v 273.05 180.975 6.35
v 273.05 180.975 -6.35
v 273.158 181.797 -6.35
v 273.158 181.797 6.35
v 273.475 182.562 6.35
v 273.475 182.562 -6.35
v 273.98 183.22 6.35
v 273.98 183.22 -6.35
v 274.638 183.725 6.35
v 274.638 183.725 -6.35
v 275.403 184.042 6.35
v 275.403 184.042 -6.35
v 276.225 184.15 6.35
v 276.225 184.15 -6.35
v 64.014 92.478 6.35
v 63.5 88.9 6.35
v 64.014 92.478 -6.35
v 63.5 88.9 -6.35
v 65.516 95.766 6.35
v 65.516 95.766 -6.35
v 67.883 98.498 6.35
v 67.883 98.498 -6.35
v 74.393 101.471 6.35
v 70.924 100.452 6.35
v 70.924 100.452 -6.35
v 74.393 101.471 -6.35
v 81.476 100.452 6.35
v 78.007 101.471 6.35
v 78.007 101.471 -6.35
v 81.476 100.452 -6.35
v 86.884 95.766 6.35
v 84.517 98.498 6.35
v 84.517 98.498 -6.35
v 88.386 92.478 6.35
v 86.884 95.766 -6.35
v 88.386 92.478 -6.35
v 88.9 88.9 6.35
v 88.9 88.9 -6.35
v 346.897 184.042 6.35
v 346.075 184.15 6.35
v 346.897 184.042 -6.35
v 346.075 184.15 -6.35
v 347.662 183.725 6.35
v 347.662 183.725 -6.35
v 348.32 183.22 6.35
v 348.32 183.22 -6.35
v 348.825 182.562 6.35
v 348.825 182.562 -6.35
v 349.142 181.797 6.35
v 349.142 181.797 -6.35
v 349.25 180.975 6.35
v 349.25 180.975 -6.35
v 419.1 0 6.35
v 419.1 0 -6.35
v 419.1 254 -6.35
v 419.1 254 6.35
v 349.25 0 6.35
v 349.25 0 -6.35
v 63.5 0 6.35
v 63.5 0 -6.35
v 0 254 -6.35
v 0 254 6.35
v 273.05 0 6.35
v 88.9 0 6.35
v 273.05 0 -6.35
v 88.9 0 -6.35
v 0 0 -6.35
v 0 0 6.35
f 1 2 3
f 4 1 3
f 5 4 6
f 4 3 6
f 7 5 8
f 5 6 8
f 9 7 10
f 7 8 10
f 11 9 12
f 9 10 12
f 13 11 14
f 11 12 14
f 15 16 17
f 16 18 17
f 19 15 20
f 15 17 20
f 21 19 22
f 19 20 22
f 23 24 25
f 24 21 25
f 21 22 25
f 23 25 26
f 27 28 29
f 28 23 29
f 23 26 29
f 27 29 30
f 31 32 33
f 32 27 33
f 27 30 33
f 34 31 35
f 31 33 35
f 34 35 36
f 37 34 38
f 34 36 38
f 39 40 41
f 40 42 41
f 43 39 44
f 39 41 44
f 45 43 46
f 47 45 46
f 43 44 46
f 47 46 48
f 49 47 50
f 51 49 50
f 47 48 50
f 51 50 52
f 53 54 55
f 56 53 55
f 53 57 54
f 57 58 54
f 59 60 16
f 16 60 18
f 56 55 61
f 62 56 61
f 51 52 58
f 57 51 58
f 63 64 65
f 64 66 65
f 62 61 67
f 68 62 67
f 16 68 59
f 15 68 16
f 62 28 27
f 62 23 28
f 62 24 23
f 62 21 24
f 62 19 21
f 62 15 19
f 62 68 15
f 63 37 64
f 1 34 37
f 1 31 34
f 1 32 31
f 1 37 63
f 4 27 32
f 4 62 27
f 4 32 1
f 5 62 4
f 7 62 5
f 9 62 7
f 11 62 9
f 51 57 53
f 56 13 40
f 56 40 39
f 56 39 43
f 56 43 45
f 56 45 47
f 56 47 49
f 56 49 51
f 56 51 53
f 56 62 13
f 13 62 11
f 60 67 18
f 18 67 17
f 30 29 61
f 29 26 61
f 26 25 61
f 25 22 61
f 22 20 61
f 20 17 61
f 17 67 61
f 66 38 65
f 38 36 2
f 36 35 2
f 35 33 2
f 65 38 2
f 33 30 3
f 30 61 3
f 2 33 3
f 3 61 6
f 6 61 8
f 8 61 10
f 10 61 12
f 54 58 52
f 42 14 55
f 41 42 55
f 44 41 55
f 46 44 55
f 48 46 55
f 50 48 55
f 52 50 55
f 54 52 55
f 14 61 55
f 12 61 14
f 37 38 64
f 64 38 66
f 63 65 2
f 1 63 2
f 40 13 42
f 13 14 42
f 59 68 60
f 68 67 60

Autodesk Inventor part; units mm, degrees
ref_plane "YZ Plane" through (0, 0, 0) normal (1, 0, 0) x (0, 1, 0)
ref_plane "XZ Plane" through (0, 0, 0) normal (0, 1, 0) x (-1, 0, 0)
ref_plane "XY Plane" through (0, 0, 0) normal (0, 0, 1) x (1, 0, 0)
sketch "Sketch1" plane through (0, 0, 0) normal (0, 0, 1) x (1, 0, 0)
  line L0 (0, 0) -> (419.1, 0)
  line L1 (419.1, 0) -> (419.1, 254)
  line L2 (419.1, 254) -> (0, 254)
  line L3 (0, 254) -> (0, 0)
  line L4 (273.05, 184.15) -> (349.25, 184.15)
  line L5 (349.25, 184.15) -> (349.25, 0)
  line L6 (349.25, 0) -> (273.05, 0)
  line L7 (273.05, 0) -> (273.05, 184.15)
  circle A0 centre (76.2, 88.9) radius 12.7
  line L8 (63.5, 88.9) -> (88.9, 88.9)
  line L9 (88.9, 88.9) -> (88.9, 0)
  line L10 (88.9, 0) -> (63.5, 0)
  line L11 (63.5, 0) -> (63.5, 88.9)
  dimension "d5" = 25.4
  dimension "d0" = 419.1
  dimension "d1" = 254
  dimension "d2" = 76.2
  dimension "d3" = 184.15
  dimension "d4" = 273.05
  dimension "d6" = 88.9
  dimension "d7" = 63.5
  dimension "d8" = 25.4
  dimension "d9" = 76.2
extrude "Extrusion1" add sketch "Sketch1" along normal mid plane 12.7 contours L3 L2 L1 L0 L5 L4 L7 L9 A0 L11
fillet "Fillet1" radius 3.175 1 edges at (273.05, 184.15, 0)
fillet "Fillet2" radius 3.175 1 edges at (349.25, 184.15, 0)
equation "\"d0\" = Length"
equation "\"d1\" = Height"
equation "\"d10\" = Thick"
equation "\"Length\" = 419.1"
equation "\"Height\" = 254"
equation "\"Thick\" = 12.7"
properties part number "InsideWall"
